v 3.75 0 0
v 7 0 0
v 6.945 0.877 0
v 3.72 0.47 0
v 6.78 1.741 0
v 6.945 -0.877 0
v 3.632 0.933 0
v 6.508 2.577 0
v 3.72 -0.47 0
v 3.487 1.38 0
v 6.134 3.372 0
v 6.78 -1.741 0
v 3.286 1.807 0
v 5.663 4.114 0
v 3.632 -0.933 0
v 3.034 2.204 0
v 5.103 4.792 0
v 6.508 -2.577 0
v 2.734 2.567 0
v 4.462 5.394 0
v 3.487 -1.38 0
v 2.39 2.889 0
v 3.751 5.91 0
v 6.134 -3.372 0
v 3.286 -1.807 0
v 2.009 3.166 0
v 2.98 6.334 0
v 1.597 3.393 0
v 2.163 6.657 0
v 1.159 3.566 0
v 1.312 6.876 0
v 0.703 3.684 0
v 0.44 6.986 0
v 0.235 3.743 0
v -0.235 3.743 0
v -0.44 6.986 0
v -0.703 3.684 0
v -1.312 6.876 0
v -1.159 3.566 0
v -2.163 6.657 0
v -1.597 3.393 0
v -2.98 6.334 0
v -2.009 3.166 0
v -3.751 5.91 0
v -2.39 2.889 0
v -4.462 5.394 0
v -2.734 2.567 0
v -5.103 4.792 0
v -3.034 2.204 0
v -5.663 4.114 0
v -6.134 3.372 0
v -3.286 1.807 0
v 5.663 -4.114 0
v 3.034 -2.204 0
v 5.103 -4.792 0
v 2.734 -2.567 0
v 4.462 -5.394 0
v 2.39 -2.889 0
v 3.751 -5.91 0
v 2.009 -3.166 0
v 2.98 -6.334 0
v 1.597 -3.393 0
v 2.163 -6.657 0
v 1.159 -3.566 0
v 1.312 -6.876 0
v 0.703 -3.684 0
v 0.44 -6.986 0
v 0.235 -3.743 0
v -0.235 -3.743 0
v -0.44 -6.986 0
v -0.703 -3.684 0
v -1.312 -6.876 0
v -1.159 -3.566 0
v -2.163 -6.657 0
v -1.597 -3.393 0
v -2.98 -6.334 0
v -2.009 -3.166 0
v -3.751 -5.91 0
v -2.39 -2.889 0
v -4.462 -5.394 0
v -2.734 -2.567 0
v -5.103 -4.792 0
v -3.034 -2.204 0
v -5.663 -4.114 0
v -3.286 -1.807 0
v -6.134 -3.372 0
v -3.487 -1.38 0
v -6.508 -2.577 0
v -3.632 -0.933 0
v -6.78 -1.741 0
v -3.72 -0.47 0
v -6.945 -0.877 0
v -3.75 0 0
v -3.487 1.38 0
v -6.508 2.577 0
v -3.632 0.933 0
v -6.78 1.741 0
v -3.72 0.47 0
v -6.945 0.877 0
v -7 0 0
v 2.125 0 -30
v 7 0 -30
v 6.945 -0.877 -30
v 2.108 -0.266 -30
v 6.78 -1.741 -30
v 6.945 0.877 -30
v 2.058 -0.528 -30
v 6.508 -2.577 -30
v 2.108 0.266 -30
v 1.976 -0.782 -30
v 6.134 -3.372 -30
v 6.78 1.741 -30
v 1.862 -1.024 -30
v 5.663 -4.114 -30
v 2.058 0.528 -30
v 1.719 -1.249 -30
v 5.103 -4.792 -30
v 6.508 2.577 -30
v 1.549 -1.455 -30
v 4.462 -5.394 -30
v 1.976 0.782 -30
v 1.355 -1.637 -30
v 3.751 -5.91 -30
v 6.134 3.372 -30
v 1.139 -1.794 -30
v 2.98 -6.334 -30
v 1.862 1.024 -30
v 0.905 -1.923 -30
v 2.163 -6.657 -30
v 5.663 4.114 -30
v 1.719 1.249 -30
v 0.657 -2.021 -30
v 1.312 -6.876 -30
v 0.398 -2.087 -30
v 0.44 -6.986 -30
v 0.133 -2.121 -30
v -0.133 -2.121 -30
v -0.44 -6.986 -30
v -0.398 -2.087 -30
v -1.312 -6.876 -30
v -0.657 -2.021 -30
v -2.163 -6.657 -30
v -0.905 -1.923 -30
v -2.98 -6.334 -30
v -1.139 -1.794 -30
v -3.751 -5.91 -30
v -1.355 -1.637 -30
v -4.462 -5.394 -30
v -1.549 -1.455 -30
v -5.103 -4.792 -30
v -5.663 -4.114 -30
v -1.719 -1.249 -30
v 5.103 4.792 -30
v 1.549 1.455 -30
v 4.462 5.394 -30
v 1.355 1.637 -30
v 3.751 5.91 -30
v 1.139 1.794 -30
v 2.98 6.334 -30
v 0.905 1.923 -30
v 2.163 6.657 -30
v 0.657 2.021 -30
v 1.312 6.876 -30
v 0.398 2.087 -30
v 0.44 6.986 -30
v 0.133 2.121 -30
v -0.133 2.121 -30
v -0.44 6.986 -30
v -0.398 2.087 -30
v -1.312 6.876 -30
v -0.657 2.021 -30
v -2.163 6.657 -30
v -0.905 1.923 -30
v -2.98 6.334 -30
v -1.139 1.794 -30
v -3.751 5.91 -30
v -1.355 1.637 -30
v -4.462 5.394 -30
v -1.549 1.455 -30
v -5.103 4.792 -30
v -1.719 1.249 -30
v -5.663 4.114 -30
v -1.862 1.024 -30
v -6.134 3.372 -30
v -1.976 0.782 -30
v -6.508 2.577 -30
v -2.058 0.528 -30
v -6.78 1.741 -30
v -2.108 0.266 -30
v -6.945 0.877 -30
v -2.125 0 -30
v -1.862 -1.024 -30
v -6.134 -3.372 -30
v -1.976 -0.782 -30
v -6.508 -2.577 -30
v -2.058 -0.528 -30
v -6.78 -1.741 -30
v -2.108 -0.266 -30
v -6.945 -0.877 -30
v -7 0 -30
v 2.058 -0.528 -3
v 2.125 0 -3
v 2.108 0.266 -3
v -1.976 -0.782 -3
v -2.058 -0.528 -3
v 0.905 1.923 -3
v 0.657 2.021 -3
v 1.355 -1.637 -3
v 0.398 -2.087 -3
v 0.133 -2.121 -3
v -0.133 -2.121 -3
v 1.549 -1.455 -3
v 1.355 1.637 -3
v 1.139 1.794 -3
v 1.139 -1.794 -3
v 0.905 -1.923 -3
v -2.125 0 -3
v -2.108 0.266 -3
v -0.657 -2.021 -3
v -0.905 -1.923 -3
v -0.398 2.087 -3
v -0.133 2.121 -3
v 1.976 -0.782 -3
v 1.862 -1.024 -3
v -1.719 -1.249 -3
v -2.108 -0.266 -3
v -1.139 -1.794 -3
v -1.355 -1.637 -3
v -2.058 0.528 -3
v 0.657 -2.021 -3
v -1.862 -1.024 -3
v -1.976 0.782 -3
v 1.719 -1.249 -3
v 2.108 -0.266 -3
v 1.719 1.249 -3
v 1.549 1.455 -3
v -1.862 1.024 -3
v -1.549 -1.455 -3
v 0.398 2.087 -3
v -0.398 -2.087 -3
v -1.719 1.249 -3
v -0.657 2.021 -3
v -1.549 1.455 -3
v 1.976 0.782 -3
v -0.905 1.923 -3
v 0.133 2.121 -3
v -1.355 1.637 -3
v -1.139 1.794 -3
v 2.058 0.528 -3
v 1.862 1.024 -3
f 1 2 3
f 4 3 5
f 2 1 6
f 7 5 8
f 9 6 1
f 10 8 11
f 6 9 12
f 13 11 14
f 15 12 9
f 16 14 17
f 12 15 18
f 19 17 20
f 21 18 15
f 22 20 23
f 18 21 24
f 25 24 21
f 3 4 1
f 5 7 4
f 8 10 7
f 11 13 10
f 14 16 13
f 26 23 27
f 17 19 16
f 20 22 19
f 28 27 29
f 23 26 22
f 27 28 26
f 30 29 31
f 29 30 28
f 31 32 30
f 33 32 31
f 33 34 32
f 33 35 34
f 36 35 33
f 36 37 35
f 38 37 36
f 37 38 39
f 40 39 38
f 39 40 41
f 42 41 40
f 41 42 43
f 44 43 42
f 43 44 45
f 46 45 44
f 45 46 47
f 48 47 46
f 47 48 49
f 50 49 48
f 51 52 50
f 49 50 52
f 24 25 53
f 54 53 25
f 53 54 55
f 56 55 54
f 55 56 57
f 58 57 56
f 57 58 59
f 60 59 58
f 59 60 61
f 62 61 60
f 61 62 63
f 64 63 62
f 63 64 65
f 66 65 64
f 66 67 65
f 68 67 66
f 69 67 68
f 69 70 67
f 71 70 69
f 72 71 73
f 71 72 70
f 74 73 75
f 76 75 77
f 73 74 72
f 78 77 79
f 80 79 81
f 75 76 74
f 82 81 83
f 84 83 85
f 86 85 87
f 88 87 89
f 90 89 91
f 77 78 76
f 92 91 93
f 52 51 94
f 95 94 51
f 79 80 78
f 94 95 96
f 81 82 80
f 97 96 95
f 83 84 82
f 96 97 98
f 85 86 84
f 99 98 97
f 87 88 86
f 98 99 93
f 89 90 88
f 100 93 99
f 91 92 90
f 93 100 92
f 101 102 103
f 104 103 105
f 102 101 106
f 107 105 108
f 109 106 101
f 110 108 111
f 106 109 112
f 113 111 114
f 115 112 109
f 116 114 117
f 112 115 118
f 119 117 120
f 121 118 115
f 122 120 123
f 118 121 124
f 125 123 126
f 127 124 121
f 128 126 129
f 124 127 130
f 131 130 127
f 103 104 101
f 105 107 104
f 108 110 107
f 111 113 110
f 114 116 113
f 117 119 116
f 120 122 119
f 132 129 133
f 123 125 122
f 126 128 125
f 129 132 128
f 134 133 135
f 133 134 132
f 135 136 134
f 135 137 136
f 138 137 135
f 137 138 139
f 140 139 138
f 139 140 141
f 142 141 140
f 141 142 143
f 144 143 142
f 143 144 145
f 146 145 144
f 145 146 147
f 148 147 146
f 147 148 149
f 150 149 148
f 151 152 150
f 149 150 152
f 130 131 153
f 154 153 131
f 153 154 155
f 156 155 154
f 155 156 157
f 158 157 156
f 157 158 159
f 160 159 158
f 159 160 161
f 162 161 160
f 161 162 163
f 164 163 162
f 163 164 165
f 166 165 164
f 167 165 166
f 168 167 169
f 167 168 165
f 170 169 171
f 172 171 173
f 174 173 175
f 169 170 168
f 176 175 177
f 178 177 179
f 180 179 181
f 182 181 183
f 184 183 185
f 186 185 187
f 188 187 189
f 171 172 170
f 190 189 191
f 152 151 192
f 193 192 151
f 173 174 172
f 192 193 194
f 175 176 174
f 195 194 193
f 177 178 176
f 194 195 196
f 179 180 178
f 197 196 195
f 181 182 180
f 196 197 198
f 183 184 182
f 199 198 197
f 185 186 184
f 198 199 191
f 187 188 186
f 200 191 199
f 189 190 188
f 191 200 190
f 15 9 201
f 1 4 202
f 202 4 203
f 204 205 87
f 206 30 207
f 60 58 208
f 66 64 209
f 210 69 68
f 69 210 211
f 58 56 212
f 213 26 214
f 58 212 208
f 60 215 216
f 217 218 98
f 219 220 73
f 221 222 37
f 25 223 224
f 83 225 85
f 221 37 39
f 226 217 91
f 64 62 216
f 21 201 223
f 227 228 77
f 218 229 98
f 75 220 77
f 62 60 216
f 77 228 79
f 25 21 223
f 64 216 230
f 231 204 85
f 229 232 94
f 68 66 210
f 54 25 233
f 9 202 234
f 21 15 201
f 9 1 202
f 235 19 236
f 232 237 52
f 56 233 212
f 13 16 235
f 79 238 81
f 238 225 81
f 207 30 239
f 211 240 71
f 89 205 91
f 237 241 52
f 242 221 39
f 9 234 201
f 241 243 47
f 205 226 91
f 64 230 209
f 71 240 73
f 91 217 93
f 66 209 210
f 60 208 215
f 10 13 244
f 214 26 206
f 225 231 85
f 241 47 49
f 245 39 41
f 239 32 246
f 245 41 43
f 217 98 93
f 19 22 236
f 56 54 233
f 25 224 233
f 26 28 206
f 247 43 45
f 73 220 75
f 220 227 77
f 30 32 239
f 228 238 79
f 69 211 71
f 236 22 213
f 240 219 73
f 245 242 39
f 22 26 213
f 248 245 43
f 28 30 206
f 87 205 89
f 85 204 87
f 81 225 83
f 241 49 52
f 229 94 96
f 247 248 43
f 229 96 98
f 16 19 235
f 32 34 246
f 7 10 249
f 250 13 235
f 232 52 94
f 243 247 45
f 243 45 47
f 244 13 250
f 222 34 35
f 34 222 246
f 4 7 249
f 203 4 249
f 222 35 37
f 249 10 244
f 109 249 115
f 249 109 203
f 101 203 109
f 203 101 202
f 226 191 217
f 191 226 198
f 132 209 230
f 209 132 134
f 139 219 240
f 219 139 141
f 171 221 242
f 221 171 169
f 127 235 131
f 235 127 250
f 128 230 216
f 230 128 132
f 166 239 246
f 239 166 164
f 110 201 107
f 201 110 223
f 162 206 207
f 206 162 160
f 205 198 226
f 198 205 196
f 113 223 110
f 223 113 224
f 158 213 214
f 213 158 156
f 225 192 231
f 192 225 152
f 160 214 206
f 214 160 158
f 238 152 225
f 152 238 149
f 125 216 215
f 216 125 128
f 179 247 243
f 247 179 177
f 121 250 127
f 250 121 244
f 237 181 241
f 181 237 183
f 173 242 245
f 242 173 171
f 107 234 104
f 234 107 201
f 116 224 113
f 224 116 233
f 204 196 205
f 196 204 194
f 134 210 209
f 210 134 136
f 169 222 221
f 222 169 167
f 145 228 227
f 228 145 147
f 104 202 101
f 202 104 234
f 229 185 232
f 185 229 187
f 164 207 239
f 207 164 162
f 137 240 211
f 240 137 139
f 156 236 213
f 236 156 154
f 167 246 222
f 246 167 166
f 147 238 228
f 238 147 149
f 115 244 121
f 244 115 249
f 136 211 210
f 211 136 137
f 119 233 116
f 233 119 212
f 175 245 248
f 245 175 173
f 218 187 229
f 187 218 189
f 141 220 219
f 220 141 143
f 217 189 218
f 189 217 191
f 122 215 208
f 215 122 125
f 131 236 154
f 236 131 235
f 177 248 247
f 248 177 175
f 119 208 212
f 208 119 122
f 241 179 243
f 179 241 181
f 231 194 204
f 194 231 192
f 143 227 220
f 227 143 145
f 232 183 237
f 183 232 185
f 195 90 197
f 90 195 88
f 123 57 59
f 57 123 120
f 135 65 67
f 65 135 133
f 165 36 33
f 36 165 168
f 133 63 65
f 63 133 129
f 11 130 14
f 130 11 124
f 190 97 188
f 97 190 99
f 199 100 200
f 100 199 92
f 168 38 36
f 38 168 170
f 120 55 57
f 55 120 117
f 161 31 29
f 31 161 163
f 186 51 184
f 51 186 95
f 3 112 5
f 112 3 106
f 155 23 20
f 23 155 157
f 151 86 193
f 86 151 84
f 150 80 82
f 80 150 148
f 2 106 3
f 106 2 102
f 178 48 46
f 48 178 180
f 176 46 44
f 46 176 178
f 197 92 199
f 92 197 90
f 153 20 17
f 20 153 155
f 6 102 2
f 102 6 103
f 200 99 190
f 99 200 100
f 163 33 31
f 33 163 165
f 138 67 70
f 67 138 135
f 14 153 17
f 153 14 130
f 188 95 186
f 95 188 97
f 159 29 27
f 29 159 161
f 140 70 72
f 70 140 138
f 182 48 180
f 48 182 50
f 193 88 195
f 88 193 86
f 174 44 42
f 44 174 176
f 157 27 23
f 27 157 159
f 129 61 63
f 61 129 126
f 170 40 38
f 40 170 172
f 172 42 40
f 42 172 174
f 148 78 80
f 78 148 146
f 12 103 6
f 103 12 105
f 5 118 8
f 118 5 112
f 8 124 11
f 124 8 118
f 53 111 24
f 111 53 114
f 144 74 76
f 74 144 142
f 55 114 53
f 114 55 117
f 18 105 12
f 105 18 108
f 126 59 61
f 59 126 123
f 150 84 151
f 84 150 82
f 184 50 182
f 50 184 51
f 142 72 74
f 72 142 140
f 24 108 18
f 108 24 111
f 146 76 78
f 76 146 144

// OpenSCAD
$fn = 50;


difference() {
	union() {
		translate(v = [0, 0, -30.0000000000]) {
			cylinder(h = 30, r = 7.0000000000);
		}
		cylinder(h = 0, r = 16.0000000000);
	}
	union() {
		translate(v = [0, 0, 0]) {
			rotate(a = [0, 0, 0]) {
				difference() {
					union() {
						#translate(v = [0, 0, -30.0000000000]) {
							cylinder(h = 30, r = 2.0000000000);
						}
						#translate(v = [0, 0, -3]) {
							cylinder(h = 3, r1 = 2.1250000000, r2 = 3.7500000000);
						}
						#translate(v = [0, 0, -30.0000000000]) {
							cylinder(h = 30, r = 2.1250000000);
						}
						#translate(v = [0, 0, -30.0000000000]) {
							cylinder(h = 30, r = 2.0000000000);
						}
					}
					union();
				}
			}
		}
	}
}
